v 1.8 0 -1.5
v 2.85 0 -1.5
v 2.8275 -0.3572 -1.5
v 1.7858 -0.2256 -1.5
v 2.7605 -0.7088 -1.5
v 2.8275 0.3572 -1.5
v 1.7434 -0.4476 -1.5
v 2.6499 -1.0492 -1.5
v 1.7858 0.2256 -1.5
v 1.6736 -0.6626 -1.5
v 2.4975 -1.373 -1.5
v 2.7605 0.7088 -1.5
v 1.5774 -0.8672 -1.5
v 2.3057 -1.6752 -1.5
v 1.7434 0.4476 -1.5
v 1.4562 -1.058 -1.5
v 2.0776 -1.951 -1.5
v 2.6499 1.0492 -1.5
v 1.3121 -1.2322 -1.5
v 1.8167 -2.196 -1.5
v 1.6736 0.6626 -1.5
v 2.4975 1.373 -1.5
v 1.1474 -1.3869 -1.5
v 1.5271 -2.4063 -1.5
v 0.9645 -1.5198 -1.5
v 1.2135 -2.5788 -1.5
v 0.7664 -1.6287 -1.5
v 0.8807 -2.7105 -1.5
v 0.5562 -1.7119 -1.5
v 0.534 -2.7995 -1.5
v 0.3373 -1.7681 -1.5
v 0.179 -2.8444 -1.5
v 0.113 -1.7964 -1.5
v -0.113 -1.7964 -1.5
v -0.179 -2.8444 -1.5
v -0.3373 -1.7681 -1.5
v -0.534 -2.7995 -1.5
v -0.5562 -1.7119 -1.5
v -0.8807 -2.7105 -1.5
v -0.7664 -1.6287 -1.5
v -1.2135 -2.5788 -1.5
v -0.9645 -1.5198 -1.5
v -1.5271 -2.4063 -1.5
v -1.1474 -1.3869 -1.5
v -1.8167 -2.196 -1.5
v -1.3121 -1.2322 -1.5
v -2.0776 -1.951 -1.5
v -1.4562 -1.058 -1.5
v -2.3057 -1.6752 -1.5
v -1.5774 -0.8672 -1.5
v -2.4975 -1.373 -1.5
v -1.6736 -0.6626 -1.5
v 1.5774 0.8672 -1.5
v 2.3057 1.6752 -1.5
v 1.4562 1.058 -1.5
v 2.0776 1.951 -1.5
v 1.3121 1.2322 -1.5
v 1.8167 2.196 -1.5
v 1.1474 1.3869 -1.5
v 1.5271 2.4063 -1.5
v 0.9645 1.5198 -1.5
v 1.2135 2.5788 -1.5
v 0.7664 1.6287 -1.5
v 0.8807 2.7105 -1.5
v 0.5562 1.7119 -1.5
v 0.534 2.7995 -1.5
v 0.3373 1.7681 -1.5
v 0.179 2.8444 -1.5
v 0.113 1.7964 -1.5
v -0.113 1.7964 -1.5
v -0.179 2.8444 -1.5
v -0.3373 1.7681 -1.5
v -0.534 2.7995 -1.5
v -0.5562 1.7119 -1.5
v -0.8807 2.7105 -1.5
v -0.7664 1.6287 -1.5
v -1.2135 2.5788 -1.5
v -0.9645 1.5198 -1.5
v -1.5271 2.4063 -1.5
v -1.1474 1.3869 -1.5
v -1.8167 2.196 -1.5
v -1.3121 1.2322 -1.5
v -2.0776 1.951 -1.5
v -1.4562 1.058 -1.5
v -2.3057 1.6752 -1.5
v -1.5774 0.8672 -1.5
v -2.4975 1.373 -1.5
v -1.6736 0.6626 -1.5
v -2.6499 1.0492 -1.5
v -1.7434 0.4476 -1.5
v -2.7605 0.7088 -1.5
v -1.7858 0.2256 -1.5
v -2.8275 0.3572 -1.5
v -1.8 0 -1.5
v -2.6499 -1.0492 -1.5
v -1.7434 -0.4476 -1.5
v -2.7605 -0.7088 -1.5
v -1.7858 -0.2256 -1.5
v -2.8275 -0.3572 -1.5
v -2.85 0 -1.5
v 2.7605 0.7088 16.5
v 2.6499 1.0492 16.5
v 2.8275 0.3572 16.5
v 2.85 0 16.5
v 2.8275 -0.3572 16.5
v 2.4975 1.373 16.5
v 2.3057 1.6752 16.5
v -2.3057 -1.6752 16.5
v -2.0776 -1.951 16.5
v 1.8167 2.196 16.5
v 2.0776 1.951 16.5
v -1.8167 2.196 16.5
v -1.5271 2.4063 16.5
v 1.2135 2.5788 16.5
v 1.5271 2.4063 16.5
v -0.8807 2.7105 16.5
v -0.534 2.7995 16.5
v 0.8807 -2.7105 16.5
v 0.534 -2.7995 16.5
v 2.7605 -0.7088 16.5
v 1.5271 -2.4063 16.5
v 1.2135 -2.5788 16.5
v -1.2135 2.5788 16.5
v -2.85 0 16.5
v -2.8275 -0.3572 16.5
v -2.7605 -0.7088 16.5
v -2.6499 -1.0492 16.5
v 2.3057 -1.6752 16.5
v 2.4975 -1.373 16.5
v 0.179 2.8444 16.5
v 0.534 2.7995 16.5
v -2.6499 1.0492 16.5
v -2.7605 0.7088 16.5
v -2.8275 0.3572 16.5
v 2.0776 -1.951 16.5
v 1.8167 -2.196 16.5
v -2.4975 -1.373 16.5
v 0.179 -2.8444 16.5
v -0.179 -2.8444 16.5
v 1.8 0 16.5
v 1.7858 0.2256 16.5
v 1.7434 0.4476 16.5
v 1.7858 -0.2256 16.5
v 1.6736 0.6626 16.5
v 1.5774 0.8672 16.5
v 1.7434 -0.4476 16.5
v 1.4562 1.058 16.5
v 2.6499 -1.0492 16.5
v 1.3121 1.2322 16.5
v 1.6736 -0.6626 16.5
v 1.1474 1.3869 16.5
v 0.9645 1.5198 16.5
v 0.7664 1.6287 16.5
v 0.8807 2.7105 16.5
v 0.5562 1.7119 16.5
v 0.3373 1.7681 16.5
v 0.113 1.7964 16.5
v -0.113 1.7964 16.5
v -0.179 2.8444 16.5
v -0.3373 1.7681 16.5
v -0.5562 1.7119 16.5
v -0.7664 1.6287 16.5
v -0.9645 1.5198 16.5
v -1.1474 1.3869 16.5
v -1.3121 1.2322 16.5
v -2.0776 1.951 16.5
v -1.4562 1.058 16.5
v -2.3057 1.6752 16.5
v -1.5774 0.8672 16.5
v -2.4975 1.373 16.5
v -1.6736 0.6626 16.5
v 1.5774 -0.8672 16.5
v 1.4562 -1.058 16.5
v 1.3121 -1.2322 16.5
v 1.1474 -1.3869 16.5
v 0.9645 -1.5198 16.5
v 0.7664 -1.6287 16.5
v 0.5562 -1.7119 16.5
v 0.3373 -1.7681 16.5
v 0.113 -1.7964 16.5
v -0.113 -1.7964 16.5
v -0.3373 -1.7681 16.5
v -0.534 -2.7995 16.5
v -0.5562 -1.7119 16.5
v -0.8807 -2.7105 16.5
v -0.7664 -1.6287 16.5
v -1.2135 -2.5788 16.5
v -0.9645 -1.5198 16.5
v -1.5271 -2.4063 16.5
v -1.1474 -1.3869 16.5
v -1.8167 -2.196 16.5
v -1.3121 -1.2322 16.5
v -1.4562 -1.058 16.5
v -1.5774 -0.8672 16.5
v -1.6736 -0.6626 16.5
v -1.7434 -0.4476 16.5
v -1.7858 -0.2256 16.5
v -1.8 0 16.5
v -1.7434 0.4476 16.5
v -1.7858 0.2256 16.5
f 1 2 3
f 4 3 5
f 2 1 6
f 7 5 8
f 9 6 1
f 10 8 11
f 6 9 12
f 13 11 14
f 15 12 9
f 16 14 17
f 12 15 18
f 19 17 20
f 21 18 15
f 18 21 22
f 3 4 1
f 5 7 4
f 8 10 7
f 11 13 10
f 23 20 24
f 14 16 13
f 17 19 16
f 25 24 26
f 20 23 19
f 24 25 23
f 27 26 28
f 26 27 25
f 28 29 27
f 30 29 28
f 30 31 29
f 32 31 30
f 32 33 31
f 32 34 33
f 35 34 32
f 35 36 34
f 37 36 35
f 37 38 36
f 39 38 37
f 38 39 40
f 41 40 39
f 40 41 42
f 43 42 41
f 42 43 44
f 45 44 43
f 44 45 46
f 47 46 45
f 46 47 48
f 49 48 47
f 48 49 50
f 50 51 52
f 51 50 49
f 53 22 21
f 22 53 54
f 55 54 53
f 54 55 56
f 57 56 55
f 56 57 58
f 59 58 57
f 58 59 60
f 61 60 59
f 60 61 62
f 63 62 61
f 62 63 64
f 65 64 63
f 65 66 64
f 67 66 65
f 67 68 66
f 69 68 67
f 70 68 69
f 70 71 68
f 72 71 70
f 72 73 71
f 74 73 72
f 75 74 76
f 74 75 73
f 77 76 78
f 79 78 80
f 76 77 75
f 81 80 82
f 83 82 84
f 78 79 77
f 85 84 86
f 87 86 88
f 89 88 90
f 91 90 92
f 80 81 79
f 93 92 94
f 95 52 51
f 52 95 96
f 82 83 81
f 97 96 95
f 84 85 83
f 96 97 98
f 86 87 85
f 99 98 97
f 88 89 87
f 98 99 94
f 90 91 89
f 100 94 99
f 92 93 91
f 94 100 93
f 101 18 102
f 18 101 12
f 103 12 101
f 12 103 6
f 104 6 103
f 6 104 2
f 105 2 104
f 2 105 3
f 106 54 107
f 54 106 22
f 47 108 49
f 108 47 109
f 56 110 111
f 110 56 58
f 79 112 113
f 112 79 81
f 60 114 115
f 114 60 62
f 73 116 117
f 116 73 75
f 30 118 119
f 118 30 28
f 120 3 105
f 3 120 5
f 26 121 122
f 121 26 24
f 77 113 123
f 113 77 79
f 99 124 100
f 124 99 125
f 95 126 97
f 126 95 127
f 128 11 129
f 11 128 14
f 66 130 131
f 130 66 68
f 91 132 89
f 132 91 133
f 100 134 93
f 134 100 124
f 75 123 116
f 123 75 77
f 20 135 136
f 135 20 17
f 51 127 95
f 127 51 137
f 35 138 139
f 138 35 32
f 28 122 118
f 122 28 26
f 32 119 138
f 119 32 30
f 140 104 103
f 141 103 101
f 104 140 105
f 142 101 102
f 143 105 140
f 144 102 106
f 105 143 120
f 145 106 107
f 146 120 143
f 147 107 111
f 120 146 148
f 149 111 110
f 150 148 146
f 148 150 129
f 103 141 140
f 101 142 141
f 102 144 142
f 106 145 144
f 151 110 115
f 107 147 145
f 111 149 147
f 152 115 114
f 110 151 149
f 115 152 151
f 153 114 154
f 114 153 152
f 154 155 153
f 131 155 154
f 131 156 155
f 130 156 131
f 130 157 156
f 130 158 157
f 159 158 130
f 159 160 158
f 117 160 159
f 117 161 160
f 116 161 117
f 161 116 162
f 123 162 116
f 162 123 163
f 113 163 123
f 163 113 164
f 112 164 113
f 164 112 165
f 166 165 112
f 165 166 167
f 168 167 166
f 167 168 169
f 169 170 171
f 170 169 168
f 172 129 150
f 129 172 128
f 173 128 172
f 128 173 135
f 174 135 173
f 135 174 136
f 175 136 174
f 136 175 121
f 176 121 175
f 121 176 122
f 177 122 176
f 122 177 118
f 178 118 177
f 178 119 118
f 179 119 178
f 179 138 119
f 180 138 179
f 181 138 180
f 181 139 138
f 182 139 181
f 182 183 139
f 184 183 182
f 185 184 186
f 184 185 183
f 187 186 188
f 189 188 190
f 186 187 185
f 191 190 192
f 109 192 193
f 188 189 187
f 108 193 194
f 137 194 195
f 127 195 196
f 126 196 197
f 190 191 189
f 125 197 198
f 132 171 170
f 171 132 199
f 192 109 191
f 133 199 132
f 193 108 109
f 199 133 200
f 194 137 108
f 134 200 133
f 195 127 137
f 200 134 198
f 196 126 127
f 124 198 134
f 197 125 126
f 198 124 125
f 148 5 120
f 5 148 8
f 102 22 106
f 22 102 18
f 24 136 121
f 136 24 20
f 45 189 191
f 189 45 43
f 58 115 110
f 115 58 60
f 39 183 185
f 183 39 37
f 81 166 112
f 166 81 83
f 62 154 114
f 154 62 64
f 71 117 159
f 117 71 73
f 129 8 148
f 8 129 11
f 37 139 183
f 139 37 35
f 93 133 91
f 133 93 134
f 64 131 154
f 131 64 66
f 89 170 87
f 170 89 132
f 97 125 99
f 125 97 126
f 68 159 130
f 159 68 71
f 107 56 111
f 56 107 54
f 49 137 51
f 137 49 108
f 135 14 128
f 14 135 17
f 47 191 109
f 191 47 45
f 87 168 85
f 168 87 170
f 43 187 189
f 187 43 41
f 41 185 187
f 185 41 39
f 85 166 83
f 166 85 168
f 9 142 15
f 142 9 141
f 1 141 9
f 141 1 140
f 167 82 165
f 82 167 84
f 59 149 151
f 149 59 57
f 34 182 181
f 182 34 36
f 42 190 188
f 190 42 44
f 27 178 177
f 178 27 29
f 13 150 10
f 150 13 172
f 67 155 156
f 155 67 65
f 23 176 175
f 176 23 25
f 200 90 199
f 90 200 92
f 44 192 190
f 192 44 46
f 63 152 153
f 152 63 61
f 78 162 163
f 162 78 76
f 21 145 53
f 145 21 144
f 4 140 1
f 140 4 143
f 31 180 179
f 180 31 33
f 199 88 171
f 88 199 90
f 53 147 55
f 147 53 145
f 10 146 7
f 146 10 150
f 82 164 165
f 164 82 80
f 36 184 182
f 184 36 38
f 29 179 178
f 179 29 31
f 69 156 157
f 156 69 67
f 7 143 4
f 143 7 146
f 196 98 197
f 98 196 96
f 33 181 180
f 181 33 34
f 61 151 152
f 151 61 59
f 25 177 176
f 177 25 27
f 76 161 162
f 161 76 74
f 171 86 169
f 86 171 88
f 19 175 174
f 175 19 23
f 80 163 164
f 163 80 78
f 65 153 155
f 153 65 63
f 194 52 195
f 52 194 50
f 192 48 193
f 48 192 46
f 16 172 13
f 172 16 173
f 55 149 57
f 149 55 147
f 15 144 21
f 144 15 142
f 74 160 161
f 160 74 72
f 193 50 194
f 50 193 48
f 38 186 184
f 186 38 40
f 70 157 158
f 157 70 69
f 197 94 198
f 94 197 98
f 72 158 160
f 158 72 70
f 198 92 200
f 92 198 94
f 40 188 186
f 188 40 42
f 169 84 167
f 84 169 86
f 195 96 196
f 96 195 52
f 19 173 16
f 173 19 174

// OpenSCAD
$fn = 50;


difference() {
	union() {
		translate(v = [0, 0, -1.5000000000]) {
			cylinder(h = 3, r = 1.0000000000);
		}
		translate(v = [0, 0, -1.5000000000]) {
			cylinder(h = 18, r = 2.8500000000);
		}
	}
	union() {
		translate(v = [0, 0, -100.0000000000]) {
			cylinder(h = 200, r = 1.8000000000);
		}
	}
}
